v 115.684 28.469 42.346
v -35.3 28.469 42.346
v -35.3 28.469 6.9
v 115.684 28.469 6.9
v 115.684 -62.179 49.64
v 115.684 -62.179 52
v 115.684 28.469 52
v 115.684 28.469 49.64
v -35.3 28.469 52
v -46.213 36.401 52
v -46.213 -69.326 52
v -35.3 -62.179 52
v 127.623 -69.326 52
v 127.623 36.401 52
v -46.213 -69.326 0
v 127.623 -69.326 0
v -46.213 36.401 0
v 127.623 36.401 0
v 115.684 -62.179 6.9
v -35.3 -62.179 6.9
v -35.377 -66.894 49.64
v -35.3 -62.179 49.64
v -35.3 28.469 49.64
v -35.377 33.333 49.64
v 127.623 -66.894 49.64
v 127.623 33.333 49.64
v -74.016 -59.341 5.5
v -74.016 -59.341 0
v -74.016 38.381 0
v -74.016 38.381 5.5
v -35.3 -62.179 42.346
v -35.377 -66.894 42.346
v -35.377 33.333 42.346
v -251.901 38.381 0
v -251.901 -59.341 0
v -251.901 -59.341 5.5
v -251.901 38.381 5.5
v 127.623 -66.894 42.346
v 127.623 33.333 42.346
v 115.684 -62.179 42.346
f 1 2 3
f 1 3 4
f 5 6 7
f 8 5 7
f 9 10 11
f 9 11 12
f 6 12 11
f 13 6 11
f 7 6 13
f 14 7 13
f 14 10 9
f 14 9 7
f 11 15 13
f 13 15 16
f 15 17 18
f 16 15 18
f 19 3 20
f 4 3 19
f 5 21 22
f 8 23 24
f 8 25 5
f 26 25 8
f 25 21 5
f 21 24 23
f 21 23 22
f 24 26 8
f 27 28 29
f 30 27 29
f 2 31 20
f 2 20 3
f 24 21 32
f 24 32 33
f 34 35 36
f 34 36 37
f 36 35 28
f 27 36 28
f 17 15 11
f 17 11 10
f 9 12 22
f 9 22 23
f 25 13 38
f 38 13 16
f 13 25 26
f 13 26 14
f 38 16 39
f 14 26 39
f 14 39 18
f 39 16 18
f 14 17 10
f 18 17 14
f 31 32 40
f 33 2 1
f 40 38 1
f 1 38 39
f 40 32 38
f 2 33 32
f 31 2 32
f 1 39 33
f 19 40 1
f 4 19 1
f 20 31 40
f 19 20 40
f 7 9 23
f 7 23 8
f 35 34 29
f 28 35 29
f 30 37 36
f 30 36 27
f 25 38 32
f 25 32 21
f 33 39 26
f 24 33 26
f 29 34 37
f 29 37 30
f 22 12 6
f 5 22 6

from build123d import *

# Parameters (mm, degrees)
F0_W     = 173.836689
F0_H     = 105.727557
F1_DEPTH = 52
F2_W     = 150.984712
F2_H     = 90.647487
F3_DEPTH = 45.1
F4_W     = 100.227278
F4_H     = 7.294171
F5_DEPTH = 163
F6_W     = 177.884955
F6_H     = 97.722433
F7_DEPTH = 5.5


with BuildPart() as f1:
    # F0 (on Top) → F1 (new body)
    with BuildSketch(Plane.XY):
        with Locations((40.70487, -16.462466)):
            Rectangle(F0_W, F0_H)
    extrude(amount=F1_DEPTH)

    # F2 (on face) → F3 (cut)
    with BuildSketch(Plane.XY.offset(52)):
        with Locations((40.191997, -16.854768)):
            Rectangle(F2_W, F2_H)
    extrude(amount=-F3_DEPTH, mode=Mode.SUBTRACT)

    # F4 (on face) → F5 (cut)
    with BuildSketch(Plane.YZ.offset(127.623215)):
        with Locations((-16.780259, 45.992807)):
            Rectangle(F4_W, F4_H)
    extrude(amount=-F5_DEPTH, mode=Mode.SUBTRACT)


with BuildPart() as f7:
    # F6 (on Top) → F7 (new body)
    with BuildSketch(Plane.XY):
        with Locations((-162.958532, -10.47972)):
            Rectangle(F6_W, F6_H)
    extrude(amount=F7_DEPTH)


solid = Compound([f1.part, f7.part])
